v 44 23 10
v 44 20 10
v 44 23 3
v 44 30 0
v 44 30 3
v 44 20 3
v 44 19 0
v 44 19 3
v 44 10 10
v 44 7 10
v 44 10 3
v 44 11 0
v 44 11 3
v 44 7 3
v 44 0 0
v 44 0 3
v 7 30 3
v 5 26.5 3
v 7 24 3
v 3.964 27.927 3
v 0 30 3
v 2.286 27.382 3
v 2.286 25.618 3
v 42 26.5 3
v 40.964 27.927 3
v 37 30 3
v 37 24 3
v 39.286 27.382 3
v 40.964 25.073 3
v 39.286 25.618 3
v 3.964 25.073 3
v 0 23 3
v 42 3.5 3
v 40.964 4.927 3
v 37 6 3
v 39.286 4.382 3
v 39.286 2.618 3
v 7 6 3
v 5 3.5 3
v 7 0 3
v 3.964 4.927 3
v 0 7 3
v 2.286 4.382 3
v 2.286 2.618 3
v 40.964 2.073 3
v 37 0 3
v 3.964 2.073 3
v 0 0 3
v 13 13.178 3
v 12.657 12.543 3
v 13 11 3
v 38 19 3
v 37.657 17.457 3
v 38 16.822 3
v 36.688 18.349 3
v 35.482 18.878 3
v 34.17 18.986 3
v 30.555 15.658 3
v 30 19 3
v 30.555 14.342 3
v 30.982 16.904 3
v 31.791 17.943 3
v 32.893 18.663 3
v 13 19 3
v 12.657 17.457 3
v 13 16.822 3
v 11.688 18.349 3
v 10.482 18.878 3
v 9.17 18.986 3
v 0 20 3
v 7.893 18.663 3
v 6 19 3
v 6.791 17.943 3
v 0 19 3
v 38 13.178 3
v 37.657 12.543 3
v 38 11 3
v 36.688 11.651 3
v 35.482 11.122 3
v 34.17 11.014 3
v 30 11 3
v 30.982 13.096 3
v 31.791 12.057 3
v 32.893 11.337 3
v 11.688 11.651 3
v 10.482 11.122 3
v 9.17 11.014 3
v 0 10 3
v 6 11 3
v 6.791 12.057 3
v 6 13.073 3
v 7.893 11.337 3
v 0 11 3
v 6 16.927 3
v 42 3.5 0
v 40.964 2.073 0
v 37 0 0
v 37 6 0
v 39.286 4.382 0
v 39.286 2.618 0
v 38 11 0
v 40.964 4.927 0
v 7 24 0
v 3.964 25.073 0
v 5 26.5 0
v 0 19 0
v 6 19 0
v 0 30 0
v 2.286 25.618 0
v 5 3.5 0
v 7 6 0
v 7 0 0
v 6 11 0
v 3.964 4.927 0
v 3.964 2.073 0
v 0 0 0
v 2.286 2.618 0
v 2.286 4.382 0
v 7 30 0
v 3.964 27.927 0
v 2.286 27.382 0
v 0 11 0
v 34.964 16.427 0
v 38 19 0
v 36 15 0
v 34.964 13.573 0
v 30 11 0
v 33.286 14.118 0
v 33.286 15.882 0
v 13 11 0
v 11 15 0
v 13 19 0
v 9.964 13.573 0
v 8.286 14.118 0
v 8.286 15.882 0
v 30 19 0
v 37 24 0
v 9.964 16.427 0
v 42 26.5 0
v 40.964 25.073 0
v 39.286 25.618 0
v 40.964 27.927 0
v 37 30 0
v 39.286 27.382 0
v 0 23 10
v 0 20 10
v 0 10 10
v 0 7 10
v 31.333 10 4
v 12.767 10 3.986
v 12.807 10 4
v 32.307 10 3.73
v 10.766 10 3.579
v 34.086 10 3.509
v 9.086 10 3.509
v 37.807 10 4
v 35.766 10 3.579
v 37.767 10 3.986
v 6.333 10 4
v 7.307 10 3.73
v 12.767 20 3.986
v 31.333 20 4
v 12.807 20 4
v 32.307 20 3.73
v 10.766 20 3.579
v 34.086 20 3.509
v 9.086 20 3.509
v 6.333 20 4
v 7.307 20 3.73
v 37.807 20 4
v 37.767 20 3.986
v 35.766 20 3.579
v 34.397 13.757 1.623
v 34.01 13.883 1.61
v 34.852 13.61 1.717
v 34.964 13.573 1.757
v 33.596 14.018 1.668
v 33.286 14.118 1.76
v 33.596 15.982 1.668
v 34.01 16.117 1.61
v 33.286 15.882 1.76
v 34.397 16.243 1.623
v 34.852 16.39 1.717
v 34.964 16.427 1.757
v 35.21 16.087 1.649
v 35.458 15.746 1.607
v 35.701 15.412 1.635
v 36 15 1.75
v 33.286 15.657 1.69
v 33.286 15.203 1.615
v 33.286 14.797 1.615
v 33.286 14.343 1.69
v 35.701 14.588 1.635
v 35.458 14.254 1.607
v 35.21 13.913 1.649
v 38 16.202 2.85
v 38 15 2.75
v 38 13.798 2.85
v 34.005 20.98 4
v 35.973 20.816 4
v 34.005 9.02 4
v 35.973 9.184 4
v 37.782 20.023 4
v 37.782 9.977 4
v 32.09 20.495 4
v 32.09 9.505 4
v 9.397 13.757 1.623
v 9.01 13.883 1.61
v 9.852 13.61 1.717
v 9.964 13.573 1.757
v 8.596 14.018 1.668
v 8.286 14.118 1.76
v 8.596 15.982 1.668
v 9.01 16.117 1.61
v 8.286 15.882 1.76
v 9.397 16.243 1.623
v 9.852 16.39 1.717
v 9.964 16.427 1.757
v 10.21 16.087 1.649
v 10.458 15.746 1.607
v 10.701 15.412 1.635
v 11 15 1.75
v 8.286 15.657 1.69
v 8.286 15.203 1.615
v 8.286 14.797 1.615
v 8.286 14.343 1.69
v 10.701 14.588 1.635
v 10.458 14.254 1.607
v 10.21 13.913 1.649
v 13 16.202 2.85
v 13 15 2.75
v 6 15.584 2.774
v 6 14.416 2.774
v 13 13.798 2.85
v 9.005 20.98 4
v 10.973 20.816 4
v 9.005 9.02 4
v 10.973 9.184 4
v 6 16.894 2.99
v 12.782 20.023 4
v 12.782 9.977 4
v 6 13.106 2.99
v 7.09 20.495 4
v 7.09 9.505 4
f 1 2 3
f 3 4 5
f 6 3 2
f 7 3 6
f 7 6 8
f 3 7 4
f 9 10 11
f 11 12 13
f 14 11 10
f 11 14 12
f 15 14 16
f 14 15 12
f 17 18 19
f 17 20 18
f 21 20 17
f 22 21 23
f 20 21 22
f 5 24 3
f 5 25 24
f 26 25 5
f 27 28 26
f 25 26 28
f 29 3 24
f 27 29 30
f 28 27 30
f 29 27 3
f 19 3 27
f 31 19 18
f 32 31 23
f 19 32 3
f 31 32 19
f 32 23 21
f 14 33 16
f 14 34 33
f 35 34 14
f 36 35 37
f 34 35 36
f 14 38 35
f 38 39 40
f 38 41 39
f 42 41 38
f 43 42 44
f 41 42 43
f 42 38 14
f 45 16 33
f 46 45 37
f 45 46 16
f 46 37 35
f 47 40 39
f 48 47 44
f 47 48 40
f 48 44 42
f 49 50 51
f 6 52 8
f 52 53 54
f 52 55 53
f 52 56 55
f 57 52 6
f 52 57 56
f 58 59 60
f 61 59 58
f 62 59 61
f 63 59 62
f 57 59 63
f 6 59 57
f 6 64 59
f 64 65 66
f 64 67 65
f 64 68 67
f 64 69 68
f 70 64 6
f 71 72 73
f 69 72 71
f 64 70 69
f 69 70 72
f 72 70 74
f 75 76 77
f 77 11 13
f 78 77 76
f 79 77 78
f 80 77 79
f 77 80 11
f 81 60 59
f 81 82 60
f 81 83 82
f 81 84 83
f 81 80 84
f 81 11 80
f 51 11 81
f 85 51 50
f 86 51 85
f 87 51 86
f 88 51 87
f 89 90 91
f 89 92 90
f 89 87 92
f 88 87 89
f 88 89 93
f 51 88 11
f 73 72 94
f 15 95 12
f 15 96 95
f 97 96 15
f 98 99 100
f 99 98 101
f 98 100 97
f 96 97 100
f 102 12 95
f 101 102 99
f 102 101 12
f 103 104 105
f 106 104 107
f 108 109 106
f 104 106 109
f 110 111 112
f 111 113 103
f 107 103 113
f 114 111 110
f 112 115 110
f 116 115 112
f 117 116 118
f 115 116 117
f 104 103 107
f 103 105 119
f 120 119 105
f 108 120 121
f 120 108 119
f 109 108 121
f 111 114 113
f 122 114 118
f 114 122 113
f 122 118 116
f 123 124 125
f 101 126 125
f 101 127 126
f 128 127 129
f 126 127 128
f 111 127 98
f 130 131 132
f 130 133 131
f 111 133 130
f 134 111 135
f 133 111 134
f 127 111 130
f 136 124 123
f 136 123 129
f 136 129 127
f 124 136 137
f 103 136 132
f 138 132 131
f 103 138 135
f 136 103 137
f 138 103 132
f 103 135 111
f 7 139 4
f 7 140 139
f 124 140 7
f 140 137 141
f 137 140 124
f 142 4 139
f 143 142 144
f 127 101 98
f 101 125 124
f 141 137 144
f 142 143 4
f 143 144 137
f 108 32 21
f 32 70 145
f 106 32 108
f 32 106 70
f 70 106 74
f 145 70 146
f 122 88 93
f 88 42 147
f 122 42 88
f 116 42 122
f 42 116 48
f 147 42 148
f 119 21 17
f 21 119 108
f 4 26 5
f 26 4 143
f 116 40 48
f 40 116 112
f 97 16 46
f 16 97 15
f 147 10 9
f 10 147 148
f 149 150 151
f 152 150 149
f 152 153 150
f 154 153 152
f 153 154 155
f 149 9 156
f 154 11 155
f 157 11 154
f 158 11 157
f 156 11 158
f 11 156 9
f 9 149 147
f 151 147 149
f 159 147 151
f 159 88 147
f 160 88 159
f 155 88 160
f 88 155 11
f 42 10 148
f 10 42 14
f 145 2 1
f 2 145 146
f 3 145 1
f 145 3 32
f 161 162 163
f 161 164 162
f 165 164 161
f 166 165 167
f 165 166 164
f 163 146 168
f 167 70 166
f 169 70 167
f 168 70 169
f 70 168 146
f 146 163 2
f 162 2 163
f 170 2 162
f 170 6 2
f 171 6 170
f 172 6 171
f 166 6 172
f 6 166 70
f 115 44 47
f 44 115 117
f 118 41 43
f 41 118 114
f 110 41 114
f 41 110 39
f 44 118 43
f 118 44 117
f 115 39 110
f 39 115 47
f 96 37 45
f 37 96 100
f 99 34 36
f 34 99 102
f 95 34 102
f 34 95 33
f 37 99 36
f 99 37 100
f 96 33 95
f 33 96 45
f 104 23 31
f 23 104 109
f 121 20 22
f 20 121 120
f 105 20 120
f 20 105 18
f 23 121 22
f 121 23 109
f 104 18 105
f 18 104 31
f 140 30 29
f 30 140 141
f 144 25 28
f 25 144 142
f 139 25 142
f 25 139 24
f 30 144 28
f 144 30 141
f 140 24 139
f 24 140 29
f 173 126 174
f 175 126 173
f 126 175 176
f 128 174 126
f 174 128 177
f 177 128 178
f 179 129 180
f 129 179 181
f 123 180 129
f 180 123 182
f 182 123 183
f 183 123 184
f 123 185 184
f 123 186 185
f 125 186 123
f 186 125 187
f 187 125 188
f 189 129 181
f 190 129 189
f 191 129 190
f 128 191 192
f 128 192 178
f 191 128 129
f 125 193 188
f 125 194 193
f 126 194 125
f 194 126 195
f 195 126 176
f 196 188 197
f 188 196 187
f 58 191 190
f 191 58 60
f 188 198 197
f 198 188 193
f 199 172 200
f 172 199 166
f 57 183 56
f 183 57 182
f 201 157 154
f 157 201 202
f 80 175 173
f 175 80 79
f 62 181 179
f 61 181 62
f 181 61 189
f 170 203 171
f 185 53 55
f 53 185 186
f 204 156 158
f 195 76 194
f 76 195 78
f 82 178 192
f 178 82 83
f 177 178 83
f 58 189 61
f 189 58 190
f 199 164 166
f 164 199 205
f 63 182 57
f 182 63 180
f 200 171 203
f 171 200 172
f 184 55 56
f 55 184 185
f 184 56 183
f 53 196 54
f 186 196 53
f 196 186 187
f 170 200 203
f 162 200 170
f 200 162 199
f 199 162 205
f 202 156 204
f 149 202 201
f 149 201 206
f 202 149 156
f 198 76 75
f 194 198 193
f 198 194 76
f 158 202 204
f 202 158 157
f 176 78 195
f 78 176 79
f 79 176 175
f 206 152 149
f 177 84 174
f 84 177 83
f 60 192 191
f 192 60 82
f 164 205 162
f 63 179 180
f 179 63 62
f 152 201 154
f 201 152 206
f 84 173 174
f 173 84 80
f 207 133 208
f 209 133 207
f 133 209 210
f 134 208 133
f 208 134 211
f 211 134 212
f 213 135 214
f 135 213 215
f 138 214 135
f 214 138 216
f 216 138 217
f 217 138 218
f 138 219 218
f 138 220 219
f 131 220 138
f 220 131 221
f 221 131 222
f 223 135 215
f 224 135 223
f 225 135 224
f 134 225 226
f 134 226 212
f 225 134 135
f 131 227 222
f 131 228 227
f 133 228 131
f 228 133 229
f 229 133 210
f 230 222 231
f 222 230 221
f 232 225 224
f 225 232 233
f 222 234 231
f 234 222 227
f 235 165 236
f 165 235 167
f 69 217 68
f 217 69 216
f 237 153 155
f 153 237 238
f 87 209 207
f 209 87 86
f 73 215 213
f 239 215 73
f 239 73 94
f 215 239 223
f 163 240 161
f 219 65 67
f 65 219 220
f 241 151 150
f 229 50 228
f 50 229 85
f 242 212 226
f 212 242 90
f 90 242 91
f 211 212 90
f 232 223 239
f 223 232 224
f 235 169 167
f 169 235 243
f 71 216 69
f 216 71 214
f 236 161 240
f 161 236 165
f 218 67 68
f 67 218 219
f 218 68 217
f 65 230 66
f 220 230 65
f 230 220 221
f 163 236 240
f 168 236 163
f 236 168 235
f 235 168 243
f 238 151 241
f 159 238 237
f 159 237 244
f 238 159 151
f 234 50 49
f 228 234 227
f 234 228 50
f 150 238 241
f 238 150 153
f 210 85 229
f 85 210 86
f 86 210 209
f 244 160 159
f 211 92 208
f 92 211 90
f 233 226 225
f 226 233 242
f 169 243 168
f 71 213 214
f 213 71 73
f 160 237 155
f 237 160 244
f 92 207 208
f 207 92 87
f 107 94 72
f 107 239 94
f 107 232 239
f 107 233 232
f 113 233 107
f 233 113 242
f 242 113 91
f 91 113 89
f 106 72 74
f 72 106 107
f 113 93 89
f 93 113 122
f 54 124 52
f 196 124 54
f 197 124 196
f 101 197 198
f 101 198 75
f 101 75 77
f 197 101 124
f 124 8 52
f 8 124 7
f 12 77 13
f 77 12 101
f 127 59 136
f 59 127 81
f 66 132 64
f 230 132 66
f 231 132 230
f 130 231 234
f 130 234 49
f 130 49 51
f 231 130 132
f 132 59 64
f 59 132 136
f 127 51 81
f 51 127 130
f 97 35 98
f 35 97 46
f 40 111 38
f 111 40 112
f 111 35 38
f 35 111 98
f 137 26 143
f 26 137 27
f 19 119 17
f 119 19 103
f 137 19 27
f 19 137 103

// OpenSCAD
// file: multiprint.scad
//----------------------------------------------------------------------
// multiprint.scad -- make it easy to print one or several of an item
//
// This uses the convention that the item to be printed is a module
// called item().  For your reference, it seems the Makerbot 2 bed
// has dimensions:  width = 285, depth = 153.
//
// example:
//
//     module item() {
//         cube([2,3,3]);
//     }
//
//     item();              // one item
//     several(2,2,30,40);  // four items, each item takes 30x40
//
// question: why does several() work with include but not add?
//----------------------------------------------------------------------

module several(a,b,itemwd,itemht) {
    // the odd math makes a single item line up with the x and y axes
    translate([-((a-1)*itemwd)/2,-((b-1)*itemht)/2,0]) {
        for (a0=[0:a-1]) {
            for (b0=[0:b-1]) {
                translate([a0*itemwd,b0*itemht,0])
                    item();
            }
        }
    }
}
// file: motormount.scad
//----------------------------------------------------------------------
// motor mount -- paramatized motor mount
//
// this file is designed to be included from another scad file.
// see motormount-ntm35.scad as an example of how to do  this.
//
// measurements:             bolt, bolt holes, cross plate
//                NTM28:     M3    16, 19      34
//                NTM35:     M3    18.9, 25    42
//                NTM42:     M3    25          49
//                NTM50:     M4    30          62
//                A10,2217:  M3    15, 19      33  (check against NTM28)
//----------------------------------------------------------------------

//----------------------------------------------------------------------
// derived constants
//----------------------------------------------------------------------

MotorBoltRad=MotorBoltDia/2;      // radius of motor bolt
ConnBoltRad=ConnBoltDia/2;        // radius of connector bolt

OverHang=ConnBoltDia+2*BoltHoleClearance;

CenterX=MountLen/2;
CenterY=(OverHang*2+Thickness*2+StickDia)/2;

//----------------------------------------------------------------------
// supporting items
//----------------------------------------------------------------------

module connbolts() {
    // holding onto stick
    translate([BoltHoleClearance+ConnBoltRad,OverHang/2,-1])
        cylinder(h=Thickness+2,r=ConnBoltRad,center=false);
    translate([MountLen-BoltHoleClearance-ConnBoltRad,OverHang/2,-1])
        cylinder(h=Thickness+2,r=ConnBoltRad,center=false);
}

module motorbolts() {
    union() {
        cylinder(h=10,r=MotorBoltRad,center=false);
        // TODO still need to fiddle with how to countersink
        translate([0,0,Thickness-1])
            cylinder(h=3,r1=0,r2=MotorBoltDia*2,center=false);
    }
}

//----------------------------------------------------------------------
// main item -- named in accordance with multiprint.scad
//----------------------------------------------------------------------

module item() {
    difference() {
        union() {
            color([.2,0,0,.1])
            cube([MountLen,StickDia+2*Thickness+2*OverHang,Thickness]);
            color([0,.2,0,.1])
                translate([0,OverHang,0])
                    cube([MountLen,Thickness,Thickness+OverHang]);
            color([0,.2,0,.1])
                translate([0,OverHang+Thickness+StickDia,0])
                    cube([MountLen,Thickness,Thickness+OverHang]);
        }

        // screw holes
        translate([0,0,0]) connbolts();
        translate([0,OverHang+2*Thickness+StickDia,0]) connbolts();

        // motor holes
        translate([CenterX+MotorHoles/2,CenterY,-1]) motorbolts();
        translate([CenterX-MotorHoles/2,CenterY,-1]) motorbolts();

        // route out some excess plastic
        // middle left
        translate([-1,OverHang+Thickness+1,-1])
            cube([1+CenterX-MotorHoles/2-MotorBoltRad-BoltHoleClearance,StickDia-2,Thickness+2]);
        // middle right
        translate([CenterX+MotorHoles/2+MotorBoltRad+BoltHoleClearance,OverHang+Thickness+1,-1])
            cube([1+CenterX-MotorHoles/2-MotorBoltRad-BoltHoleClearance,StickDia-2,Thickness+2]);
        // middle
        translate([CenterX-MotorHoles/2+MotorBoltRad+BoltHoleClearance,OverHang+Thickness+1,-1])
            cube([MotorHoles-2*MotorBoltDia-BoltHoleClearance,StickDia-2,Thickness+2]);
        // bottom
        translate([BoltHoleClearance*2+ConnBoltDia,-1,-1])
            cube([MountLen-BoltHoleClearance*4-ConnBoltDia*2,OverHang,Thickness+2]);
        // top
        translate([BoltHoleClearance*2+ConnBoltDia,OverHang+Thickness*2+StickDia+1,-1])
            cube([MountLen-BoltHoleClearance*4-ConnBoltDia*2,OverHang,Thickness+2]);
    }
}
// main file
//----------------------------------------------------------------------
// motormount-ntm35 -- motormount sized for NTM35 motors
//
// measurements:             bolt, bolt holes, cross plate
//                NTM28:     M3    16, 19      34
//                NTM35:     M3    18.9, 25    42
//                NTM42:     M3    25          49
//                NTM50:     M4    30          62
//                A10,2217:  M3    15, 19      33  (check against NTM28)
//----------------------------------------------------------------------

// size customizations.  for each motor size, change these parms.

MountLen=44;      // length along the stick
MotorHoles=25;  // the set of motor hole distances
MotorBoltDia=3;   // motor bolt size

// other customizations.  these will need to be changed less often.

Thickness=3;         // thickness of the plate
StickDia=10;         // stick diameter, for square stick
ConnBoltDia=3;       // connector bold diameter

BoltHoleClearance=2; // how much material to leave around bolt holes

include <motormount.scad>
include <multiprint.scad>

item();
//several(2,2,40,30);
